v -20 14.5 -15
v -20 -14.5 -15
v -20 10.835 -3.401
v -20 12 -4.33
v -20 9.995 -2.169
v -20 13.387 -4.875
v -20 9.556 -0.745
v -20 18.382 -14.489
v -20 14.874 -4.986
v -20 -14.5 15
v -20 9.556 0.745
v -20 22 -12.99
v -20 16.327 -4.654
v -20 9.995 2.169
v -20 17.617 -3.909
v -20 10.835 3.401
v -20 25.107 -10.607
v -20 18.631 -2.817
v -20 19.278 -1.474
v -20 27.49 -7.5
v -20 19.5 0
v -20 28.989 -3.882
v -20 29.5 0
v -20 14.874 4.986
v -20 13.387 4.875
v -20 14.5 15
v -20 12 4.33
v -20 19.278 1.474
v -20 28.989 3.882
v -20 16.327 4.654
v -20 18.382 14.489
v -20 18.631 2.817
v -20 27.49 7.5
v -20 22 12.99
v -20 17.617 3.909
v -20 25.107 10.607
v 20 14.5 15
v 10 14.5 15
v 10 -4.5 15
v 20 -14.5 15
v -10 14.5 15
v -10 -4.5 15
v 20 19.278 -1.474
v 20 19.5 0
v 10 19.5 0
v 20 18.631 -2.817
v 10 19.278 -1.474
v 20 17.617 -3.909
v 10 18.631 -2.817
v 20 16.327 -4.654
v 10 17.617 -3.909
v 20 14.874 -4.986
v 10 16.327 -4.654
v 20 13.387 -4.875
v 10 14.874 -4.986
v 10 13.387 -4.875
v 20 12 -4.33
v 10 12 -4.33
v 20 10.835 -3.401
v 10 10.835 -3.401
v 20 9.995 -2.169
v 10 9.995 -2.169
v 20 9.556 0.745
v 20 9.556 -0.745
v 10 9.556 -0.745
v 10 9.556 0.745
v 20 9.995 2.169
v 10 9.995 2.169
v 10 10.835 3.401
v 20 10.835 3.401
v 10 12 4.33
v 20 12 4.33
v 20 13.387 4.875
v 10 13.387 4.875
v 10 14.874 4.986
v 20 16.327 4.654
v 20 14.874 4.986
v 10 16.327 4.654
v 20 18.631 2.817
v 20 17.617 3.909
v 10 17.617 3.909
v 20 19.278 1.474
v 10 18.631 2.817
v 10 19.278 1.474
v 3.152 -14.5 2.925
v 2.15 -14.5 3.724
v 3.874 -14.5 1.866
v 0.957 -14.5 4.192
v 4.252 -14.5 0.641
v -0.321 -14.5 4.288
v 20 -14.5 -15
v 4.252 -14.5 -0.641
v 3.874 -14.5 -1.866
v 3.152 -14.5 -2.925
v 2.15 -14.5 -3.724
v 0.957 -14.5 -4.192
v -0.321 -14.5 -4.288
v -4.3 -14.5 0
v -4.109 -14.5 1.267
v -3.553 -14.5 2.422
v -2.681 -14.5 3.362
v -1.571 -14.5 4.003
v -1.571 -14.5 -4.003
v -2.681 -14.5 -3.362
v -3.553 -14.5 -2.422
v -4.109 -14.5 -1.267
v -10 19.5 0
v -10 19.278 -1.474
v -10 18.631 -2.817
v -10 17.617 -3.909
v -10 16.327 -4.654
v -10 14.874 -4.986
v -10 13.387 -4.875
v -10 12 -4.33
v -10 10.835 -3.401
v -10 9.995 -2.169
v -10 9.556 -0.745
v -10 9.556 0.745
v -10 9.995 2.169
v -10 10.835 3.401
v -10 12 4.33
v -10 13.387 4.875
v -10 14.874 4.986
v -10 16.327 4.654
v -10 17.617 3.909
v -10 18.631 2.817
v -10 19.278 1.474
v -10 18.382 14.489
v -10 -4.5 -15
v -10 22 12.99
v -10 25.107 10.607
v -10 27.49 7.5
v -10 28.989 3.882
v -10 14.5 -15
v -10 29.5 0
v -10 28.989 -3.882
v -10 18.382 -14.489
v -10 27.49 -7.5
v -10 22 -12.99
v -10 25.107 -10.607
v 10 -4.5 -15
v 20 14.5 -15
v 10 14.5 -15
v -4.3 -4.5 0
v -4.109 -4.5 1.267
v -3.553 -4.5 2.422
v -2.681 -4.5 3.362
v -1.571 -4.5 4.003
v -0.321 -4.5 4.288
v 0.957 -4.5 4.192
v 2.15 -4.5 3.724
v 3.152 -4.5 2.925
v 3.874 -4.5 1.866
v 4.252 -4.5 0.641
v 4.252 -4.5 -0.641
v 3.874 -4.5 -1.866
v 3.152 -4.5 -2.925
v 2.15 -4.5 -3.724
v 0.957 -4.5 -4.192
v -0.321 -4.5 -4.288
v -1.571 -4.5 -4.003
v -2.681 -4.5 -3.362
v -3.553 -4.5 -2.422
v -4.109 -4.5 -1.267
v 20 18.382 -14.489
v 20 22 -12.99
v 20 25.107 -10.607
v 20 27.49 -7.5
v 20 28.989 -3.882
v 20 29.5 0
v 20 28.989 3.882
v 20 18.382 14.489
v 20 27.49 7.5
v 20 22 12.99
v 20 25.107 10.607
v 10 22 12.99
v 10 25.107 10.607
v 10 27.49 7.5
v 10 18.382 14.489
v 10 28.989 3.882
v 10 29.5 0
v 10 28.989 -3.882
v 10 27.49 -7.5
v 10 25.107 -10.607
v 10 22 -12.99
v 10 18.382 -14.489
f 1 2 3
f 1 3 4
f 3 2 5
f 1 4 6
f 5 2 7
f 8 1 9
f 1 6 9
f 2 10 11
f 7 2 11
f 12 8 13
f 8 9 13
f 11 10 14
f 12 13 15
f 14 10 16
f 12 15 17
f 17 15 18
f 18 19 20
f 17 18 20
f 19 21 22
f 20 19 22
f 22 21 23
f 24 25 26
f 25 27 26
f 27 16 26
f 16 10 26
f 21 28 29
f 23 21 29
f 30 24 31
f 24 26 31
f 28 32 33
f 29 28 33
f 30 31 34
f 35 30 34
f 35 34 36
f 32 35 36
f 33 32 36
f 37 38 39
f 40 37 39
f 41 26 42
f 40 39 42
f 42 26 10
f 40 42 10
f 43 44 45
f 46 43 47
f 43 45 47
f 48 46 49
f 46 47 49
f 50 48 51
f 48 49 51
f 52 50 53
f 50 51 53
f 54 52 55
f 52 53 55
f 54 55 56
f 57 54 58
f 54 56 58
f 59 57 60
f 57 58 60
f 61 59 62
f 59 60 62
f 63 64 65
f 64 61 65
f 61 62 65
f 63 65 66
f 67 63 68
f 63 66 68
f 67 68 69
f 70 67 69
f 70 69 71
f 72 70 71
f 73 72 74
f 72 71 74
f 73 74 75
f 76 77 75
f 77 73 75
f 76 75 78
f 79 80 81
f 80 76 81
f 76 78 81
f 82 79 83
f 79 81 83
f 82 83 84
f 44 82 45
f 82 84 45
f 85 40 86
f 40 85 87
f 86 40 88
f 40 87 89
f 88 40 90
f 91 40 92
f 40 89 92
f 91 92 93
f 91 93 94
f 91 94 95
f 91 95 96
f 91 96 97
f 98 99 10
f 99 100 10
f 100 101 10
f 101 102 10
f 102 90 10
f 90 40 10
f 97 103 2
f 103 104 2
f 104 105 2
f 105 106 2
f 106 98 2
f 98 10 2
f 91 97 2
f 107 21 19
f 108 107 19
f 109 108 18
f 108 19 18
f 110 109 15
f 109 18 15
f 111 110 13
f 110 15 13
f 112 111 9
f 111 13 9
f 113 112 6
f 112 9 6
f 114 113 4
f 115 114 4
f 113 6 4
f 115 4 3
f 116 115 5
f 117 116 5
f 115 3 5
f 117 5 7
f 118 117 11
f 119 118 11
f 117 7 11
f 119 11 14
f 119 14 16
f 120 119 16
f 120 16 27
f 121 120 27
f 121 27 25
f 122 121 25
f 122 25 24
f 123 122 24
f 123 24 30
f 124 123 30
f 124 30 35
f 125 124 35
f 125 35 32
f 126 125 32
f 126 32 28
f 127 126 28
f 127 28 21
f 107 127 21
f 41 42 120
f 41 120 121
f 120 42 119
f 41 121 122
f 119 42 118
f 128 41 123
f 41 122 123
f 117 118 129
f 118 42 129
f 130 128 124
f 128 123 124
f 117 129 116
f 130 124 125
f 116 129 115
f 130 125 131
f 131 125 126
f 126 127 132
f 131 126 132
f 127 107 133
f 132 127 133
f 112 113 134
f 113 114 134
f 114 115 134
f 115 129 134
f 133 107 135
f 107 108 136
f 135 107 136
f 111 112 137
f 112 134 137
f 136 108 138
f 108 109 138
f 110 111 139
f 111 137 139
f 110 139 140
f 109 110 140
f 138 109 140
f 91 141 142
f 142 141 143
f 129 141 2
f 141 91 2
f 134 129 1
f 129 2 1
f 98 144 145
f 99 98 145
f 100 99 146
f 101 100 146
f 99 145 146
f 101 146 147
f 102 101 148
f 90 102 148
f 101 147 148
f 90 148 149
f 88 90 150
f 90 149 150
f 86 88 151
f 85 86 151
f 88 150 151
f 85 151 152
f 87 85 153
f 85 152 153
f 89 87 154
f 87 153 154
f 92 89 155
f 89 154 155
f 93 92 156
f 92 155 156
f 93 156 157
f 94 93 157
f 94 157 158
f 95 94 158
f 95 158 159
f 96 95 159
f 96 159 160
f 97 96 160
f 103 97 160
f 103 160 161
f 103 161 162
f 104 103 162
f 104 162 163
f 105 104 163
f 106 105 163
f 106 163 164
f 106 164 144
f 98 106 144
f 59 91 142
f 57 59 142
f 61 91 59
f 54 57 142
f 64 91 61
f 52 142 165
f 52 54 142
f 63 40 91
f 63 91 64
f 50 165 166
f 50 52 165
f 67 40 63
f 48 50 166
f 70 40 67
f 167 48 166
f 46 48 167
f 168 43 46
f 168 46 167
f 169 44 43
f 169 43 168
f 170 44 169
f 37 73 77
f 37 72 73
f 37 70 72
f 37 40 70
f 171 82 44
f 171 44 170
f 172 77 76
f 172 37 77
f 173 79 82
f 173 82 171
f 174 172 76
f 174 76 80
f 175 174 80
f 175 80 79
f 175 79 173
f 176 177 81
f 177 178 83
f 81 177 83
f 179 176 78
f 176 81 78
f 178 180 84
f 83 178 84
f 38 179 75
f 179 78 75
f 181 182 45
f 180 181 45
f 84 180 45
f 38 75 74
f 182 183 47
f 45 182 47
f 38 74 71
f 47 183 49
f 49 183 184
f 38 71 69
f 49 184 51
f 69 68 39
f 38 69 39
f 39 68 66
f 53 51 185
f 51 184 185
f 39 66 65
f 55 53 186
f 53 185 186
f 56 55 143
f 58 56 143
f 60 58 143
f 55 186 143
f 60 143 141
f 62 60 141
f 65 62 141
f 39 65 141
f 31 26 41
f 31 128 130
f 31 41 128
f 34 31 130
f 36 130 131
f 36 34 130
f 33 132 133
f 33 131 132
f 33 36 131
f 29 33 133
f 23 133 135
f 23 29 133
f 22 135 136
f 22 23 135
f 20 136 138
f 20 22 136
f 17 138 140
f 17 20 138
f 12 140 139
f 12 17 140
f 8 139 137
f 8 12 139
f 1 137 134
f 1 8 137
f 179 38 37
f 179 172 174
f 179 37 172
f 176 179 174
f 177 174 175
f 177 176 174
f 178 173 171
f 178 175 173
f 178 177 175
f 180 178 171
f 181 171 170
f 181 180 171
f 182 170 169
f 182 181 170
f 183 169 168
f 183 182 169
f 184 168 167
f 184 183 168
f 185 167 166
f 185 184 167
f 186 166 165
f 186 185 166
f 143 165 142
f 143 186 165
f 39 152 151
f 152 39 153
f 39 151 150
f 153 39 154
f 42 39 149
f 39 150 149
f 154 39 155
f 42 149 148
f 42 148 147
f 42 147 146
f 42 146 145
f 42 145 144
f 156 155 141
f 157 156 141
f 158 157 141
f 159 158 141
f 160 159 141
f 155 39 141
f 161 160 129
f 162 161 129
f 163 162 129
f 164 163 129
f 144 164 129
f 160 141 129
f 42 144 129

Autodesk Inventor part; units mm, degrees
ref_plane "YZ Plane" through (0, 0, 0) normal (1, 0, 0) x (0, 1, 0)
ref_plane "XZ Plane" through (0, 0, 0) normal (0, 1, 0) x (-1, 0, 0)
ref_plane "XY Plane" through (0, 0, 0) normal (0, 0, 1) x (1, 0, 0)
sketch "Sketch1" plane through (0, 0, 0) normal (1, 0, 0) x (0, 1, 0)
  line L0 (-14.5, 15) -> (-14.5, -15)
  line L1 (-14.5, -15) -> (14.5, -15)
  arc A0 (14.5, -15) -> (14.5, 15) centre (14.5, 0) ccw
  line L2 (14.5, 15) -> (-14.5, 15)
  circle A1 centre (14.5, 0) radius 5
  point P0 (0, 0)
  point P1 (0, -15)
  dimension "d0" = 15
  dimension "d1" = 10
  dimension "d2" = 29
extrude "Extrusion1" add sketch "Sketch1" along normal mid plane 40
sketch "Sketch2" plane through (0, 0, 0) normal (0, 0, 1) x (1, 0, 0)
  line L0 (-20, 14.5) -> (20, 14.5) construction
  line L1 (20, 14.5) -> (20, 14.5) construction
  line L2 (-20, 14.5) -> (20, 14.5) construction
  line L3 (-20, 14.5) -> (-20, 14.5) construction
  line L4 (-20, 14.5) -> (20, 14.5) construction
  line L5 (20, -14.5) -> (20, 14.5) construction
  line L6 (20, -14.5) -> (-20, -14.5) construction
  line L7 (-20, 14.5) -> (-20, -14.5) construction
  line L8 (-10, 29.5) -> (10, 29.5)
  line L9 (10, 29.5) -> (10, -4.5)
  line L10 (10, -4.5) -> (-10, -4.5)
  line L11 (-10, -4.5) -> (-10, 29.5)
  line L12 (-20, 29.5) -> (20, 29.5) construction
  point P0 (0, 0)
  point P1 (0, 29.5)
  dimension "d5" = 20
  dimension "d6" = 10
  dimension "d7" = 34
extrude "Extrusion2" cut sketch "Sketch2" along normal mid plane 40
sketch "Sketch3" plane through (0, 0, 0) normal (0, 1, 0) x (-1, 0, 0)
  circle A0 centre (0, 0) radius 4.3
  dimension "d10" = 8.6
extrude "Extrusion3" cut sketch "Sketch3" against normal through all
properties part number "cuerpo_obj3"
